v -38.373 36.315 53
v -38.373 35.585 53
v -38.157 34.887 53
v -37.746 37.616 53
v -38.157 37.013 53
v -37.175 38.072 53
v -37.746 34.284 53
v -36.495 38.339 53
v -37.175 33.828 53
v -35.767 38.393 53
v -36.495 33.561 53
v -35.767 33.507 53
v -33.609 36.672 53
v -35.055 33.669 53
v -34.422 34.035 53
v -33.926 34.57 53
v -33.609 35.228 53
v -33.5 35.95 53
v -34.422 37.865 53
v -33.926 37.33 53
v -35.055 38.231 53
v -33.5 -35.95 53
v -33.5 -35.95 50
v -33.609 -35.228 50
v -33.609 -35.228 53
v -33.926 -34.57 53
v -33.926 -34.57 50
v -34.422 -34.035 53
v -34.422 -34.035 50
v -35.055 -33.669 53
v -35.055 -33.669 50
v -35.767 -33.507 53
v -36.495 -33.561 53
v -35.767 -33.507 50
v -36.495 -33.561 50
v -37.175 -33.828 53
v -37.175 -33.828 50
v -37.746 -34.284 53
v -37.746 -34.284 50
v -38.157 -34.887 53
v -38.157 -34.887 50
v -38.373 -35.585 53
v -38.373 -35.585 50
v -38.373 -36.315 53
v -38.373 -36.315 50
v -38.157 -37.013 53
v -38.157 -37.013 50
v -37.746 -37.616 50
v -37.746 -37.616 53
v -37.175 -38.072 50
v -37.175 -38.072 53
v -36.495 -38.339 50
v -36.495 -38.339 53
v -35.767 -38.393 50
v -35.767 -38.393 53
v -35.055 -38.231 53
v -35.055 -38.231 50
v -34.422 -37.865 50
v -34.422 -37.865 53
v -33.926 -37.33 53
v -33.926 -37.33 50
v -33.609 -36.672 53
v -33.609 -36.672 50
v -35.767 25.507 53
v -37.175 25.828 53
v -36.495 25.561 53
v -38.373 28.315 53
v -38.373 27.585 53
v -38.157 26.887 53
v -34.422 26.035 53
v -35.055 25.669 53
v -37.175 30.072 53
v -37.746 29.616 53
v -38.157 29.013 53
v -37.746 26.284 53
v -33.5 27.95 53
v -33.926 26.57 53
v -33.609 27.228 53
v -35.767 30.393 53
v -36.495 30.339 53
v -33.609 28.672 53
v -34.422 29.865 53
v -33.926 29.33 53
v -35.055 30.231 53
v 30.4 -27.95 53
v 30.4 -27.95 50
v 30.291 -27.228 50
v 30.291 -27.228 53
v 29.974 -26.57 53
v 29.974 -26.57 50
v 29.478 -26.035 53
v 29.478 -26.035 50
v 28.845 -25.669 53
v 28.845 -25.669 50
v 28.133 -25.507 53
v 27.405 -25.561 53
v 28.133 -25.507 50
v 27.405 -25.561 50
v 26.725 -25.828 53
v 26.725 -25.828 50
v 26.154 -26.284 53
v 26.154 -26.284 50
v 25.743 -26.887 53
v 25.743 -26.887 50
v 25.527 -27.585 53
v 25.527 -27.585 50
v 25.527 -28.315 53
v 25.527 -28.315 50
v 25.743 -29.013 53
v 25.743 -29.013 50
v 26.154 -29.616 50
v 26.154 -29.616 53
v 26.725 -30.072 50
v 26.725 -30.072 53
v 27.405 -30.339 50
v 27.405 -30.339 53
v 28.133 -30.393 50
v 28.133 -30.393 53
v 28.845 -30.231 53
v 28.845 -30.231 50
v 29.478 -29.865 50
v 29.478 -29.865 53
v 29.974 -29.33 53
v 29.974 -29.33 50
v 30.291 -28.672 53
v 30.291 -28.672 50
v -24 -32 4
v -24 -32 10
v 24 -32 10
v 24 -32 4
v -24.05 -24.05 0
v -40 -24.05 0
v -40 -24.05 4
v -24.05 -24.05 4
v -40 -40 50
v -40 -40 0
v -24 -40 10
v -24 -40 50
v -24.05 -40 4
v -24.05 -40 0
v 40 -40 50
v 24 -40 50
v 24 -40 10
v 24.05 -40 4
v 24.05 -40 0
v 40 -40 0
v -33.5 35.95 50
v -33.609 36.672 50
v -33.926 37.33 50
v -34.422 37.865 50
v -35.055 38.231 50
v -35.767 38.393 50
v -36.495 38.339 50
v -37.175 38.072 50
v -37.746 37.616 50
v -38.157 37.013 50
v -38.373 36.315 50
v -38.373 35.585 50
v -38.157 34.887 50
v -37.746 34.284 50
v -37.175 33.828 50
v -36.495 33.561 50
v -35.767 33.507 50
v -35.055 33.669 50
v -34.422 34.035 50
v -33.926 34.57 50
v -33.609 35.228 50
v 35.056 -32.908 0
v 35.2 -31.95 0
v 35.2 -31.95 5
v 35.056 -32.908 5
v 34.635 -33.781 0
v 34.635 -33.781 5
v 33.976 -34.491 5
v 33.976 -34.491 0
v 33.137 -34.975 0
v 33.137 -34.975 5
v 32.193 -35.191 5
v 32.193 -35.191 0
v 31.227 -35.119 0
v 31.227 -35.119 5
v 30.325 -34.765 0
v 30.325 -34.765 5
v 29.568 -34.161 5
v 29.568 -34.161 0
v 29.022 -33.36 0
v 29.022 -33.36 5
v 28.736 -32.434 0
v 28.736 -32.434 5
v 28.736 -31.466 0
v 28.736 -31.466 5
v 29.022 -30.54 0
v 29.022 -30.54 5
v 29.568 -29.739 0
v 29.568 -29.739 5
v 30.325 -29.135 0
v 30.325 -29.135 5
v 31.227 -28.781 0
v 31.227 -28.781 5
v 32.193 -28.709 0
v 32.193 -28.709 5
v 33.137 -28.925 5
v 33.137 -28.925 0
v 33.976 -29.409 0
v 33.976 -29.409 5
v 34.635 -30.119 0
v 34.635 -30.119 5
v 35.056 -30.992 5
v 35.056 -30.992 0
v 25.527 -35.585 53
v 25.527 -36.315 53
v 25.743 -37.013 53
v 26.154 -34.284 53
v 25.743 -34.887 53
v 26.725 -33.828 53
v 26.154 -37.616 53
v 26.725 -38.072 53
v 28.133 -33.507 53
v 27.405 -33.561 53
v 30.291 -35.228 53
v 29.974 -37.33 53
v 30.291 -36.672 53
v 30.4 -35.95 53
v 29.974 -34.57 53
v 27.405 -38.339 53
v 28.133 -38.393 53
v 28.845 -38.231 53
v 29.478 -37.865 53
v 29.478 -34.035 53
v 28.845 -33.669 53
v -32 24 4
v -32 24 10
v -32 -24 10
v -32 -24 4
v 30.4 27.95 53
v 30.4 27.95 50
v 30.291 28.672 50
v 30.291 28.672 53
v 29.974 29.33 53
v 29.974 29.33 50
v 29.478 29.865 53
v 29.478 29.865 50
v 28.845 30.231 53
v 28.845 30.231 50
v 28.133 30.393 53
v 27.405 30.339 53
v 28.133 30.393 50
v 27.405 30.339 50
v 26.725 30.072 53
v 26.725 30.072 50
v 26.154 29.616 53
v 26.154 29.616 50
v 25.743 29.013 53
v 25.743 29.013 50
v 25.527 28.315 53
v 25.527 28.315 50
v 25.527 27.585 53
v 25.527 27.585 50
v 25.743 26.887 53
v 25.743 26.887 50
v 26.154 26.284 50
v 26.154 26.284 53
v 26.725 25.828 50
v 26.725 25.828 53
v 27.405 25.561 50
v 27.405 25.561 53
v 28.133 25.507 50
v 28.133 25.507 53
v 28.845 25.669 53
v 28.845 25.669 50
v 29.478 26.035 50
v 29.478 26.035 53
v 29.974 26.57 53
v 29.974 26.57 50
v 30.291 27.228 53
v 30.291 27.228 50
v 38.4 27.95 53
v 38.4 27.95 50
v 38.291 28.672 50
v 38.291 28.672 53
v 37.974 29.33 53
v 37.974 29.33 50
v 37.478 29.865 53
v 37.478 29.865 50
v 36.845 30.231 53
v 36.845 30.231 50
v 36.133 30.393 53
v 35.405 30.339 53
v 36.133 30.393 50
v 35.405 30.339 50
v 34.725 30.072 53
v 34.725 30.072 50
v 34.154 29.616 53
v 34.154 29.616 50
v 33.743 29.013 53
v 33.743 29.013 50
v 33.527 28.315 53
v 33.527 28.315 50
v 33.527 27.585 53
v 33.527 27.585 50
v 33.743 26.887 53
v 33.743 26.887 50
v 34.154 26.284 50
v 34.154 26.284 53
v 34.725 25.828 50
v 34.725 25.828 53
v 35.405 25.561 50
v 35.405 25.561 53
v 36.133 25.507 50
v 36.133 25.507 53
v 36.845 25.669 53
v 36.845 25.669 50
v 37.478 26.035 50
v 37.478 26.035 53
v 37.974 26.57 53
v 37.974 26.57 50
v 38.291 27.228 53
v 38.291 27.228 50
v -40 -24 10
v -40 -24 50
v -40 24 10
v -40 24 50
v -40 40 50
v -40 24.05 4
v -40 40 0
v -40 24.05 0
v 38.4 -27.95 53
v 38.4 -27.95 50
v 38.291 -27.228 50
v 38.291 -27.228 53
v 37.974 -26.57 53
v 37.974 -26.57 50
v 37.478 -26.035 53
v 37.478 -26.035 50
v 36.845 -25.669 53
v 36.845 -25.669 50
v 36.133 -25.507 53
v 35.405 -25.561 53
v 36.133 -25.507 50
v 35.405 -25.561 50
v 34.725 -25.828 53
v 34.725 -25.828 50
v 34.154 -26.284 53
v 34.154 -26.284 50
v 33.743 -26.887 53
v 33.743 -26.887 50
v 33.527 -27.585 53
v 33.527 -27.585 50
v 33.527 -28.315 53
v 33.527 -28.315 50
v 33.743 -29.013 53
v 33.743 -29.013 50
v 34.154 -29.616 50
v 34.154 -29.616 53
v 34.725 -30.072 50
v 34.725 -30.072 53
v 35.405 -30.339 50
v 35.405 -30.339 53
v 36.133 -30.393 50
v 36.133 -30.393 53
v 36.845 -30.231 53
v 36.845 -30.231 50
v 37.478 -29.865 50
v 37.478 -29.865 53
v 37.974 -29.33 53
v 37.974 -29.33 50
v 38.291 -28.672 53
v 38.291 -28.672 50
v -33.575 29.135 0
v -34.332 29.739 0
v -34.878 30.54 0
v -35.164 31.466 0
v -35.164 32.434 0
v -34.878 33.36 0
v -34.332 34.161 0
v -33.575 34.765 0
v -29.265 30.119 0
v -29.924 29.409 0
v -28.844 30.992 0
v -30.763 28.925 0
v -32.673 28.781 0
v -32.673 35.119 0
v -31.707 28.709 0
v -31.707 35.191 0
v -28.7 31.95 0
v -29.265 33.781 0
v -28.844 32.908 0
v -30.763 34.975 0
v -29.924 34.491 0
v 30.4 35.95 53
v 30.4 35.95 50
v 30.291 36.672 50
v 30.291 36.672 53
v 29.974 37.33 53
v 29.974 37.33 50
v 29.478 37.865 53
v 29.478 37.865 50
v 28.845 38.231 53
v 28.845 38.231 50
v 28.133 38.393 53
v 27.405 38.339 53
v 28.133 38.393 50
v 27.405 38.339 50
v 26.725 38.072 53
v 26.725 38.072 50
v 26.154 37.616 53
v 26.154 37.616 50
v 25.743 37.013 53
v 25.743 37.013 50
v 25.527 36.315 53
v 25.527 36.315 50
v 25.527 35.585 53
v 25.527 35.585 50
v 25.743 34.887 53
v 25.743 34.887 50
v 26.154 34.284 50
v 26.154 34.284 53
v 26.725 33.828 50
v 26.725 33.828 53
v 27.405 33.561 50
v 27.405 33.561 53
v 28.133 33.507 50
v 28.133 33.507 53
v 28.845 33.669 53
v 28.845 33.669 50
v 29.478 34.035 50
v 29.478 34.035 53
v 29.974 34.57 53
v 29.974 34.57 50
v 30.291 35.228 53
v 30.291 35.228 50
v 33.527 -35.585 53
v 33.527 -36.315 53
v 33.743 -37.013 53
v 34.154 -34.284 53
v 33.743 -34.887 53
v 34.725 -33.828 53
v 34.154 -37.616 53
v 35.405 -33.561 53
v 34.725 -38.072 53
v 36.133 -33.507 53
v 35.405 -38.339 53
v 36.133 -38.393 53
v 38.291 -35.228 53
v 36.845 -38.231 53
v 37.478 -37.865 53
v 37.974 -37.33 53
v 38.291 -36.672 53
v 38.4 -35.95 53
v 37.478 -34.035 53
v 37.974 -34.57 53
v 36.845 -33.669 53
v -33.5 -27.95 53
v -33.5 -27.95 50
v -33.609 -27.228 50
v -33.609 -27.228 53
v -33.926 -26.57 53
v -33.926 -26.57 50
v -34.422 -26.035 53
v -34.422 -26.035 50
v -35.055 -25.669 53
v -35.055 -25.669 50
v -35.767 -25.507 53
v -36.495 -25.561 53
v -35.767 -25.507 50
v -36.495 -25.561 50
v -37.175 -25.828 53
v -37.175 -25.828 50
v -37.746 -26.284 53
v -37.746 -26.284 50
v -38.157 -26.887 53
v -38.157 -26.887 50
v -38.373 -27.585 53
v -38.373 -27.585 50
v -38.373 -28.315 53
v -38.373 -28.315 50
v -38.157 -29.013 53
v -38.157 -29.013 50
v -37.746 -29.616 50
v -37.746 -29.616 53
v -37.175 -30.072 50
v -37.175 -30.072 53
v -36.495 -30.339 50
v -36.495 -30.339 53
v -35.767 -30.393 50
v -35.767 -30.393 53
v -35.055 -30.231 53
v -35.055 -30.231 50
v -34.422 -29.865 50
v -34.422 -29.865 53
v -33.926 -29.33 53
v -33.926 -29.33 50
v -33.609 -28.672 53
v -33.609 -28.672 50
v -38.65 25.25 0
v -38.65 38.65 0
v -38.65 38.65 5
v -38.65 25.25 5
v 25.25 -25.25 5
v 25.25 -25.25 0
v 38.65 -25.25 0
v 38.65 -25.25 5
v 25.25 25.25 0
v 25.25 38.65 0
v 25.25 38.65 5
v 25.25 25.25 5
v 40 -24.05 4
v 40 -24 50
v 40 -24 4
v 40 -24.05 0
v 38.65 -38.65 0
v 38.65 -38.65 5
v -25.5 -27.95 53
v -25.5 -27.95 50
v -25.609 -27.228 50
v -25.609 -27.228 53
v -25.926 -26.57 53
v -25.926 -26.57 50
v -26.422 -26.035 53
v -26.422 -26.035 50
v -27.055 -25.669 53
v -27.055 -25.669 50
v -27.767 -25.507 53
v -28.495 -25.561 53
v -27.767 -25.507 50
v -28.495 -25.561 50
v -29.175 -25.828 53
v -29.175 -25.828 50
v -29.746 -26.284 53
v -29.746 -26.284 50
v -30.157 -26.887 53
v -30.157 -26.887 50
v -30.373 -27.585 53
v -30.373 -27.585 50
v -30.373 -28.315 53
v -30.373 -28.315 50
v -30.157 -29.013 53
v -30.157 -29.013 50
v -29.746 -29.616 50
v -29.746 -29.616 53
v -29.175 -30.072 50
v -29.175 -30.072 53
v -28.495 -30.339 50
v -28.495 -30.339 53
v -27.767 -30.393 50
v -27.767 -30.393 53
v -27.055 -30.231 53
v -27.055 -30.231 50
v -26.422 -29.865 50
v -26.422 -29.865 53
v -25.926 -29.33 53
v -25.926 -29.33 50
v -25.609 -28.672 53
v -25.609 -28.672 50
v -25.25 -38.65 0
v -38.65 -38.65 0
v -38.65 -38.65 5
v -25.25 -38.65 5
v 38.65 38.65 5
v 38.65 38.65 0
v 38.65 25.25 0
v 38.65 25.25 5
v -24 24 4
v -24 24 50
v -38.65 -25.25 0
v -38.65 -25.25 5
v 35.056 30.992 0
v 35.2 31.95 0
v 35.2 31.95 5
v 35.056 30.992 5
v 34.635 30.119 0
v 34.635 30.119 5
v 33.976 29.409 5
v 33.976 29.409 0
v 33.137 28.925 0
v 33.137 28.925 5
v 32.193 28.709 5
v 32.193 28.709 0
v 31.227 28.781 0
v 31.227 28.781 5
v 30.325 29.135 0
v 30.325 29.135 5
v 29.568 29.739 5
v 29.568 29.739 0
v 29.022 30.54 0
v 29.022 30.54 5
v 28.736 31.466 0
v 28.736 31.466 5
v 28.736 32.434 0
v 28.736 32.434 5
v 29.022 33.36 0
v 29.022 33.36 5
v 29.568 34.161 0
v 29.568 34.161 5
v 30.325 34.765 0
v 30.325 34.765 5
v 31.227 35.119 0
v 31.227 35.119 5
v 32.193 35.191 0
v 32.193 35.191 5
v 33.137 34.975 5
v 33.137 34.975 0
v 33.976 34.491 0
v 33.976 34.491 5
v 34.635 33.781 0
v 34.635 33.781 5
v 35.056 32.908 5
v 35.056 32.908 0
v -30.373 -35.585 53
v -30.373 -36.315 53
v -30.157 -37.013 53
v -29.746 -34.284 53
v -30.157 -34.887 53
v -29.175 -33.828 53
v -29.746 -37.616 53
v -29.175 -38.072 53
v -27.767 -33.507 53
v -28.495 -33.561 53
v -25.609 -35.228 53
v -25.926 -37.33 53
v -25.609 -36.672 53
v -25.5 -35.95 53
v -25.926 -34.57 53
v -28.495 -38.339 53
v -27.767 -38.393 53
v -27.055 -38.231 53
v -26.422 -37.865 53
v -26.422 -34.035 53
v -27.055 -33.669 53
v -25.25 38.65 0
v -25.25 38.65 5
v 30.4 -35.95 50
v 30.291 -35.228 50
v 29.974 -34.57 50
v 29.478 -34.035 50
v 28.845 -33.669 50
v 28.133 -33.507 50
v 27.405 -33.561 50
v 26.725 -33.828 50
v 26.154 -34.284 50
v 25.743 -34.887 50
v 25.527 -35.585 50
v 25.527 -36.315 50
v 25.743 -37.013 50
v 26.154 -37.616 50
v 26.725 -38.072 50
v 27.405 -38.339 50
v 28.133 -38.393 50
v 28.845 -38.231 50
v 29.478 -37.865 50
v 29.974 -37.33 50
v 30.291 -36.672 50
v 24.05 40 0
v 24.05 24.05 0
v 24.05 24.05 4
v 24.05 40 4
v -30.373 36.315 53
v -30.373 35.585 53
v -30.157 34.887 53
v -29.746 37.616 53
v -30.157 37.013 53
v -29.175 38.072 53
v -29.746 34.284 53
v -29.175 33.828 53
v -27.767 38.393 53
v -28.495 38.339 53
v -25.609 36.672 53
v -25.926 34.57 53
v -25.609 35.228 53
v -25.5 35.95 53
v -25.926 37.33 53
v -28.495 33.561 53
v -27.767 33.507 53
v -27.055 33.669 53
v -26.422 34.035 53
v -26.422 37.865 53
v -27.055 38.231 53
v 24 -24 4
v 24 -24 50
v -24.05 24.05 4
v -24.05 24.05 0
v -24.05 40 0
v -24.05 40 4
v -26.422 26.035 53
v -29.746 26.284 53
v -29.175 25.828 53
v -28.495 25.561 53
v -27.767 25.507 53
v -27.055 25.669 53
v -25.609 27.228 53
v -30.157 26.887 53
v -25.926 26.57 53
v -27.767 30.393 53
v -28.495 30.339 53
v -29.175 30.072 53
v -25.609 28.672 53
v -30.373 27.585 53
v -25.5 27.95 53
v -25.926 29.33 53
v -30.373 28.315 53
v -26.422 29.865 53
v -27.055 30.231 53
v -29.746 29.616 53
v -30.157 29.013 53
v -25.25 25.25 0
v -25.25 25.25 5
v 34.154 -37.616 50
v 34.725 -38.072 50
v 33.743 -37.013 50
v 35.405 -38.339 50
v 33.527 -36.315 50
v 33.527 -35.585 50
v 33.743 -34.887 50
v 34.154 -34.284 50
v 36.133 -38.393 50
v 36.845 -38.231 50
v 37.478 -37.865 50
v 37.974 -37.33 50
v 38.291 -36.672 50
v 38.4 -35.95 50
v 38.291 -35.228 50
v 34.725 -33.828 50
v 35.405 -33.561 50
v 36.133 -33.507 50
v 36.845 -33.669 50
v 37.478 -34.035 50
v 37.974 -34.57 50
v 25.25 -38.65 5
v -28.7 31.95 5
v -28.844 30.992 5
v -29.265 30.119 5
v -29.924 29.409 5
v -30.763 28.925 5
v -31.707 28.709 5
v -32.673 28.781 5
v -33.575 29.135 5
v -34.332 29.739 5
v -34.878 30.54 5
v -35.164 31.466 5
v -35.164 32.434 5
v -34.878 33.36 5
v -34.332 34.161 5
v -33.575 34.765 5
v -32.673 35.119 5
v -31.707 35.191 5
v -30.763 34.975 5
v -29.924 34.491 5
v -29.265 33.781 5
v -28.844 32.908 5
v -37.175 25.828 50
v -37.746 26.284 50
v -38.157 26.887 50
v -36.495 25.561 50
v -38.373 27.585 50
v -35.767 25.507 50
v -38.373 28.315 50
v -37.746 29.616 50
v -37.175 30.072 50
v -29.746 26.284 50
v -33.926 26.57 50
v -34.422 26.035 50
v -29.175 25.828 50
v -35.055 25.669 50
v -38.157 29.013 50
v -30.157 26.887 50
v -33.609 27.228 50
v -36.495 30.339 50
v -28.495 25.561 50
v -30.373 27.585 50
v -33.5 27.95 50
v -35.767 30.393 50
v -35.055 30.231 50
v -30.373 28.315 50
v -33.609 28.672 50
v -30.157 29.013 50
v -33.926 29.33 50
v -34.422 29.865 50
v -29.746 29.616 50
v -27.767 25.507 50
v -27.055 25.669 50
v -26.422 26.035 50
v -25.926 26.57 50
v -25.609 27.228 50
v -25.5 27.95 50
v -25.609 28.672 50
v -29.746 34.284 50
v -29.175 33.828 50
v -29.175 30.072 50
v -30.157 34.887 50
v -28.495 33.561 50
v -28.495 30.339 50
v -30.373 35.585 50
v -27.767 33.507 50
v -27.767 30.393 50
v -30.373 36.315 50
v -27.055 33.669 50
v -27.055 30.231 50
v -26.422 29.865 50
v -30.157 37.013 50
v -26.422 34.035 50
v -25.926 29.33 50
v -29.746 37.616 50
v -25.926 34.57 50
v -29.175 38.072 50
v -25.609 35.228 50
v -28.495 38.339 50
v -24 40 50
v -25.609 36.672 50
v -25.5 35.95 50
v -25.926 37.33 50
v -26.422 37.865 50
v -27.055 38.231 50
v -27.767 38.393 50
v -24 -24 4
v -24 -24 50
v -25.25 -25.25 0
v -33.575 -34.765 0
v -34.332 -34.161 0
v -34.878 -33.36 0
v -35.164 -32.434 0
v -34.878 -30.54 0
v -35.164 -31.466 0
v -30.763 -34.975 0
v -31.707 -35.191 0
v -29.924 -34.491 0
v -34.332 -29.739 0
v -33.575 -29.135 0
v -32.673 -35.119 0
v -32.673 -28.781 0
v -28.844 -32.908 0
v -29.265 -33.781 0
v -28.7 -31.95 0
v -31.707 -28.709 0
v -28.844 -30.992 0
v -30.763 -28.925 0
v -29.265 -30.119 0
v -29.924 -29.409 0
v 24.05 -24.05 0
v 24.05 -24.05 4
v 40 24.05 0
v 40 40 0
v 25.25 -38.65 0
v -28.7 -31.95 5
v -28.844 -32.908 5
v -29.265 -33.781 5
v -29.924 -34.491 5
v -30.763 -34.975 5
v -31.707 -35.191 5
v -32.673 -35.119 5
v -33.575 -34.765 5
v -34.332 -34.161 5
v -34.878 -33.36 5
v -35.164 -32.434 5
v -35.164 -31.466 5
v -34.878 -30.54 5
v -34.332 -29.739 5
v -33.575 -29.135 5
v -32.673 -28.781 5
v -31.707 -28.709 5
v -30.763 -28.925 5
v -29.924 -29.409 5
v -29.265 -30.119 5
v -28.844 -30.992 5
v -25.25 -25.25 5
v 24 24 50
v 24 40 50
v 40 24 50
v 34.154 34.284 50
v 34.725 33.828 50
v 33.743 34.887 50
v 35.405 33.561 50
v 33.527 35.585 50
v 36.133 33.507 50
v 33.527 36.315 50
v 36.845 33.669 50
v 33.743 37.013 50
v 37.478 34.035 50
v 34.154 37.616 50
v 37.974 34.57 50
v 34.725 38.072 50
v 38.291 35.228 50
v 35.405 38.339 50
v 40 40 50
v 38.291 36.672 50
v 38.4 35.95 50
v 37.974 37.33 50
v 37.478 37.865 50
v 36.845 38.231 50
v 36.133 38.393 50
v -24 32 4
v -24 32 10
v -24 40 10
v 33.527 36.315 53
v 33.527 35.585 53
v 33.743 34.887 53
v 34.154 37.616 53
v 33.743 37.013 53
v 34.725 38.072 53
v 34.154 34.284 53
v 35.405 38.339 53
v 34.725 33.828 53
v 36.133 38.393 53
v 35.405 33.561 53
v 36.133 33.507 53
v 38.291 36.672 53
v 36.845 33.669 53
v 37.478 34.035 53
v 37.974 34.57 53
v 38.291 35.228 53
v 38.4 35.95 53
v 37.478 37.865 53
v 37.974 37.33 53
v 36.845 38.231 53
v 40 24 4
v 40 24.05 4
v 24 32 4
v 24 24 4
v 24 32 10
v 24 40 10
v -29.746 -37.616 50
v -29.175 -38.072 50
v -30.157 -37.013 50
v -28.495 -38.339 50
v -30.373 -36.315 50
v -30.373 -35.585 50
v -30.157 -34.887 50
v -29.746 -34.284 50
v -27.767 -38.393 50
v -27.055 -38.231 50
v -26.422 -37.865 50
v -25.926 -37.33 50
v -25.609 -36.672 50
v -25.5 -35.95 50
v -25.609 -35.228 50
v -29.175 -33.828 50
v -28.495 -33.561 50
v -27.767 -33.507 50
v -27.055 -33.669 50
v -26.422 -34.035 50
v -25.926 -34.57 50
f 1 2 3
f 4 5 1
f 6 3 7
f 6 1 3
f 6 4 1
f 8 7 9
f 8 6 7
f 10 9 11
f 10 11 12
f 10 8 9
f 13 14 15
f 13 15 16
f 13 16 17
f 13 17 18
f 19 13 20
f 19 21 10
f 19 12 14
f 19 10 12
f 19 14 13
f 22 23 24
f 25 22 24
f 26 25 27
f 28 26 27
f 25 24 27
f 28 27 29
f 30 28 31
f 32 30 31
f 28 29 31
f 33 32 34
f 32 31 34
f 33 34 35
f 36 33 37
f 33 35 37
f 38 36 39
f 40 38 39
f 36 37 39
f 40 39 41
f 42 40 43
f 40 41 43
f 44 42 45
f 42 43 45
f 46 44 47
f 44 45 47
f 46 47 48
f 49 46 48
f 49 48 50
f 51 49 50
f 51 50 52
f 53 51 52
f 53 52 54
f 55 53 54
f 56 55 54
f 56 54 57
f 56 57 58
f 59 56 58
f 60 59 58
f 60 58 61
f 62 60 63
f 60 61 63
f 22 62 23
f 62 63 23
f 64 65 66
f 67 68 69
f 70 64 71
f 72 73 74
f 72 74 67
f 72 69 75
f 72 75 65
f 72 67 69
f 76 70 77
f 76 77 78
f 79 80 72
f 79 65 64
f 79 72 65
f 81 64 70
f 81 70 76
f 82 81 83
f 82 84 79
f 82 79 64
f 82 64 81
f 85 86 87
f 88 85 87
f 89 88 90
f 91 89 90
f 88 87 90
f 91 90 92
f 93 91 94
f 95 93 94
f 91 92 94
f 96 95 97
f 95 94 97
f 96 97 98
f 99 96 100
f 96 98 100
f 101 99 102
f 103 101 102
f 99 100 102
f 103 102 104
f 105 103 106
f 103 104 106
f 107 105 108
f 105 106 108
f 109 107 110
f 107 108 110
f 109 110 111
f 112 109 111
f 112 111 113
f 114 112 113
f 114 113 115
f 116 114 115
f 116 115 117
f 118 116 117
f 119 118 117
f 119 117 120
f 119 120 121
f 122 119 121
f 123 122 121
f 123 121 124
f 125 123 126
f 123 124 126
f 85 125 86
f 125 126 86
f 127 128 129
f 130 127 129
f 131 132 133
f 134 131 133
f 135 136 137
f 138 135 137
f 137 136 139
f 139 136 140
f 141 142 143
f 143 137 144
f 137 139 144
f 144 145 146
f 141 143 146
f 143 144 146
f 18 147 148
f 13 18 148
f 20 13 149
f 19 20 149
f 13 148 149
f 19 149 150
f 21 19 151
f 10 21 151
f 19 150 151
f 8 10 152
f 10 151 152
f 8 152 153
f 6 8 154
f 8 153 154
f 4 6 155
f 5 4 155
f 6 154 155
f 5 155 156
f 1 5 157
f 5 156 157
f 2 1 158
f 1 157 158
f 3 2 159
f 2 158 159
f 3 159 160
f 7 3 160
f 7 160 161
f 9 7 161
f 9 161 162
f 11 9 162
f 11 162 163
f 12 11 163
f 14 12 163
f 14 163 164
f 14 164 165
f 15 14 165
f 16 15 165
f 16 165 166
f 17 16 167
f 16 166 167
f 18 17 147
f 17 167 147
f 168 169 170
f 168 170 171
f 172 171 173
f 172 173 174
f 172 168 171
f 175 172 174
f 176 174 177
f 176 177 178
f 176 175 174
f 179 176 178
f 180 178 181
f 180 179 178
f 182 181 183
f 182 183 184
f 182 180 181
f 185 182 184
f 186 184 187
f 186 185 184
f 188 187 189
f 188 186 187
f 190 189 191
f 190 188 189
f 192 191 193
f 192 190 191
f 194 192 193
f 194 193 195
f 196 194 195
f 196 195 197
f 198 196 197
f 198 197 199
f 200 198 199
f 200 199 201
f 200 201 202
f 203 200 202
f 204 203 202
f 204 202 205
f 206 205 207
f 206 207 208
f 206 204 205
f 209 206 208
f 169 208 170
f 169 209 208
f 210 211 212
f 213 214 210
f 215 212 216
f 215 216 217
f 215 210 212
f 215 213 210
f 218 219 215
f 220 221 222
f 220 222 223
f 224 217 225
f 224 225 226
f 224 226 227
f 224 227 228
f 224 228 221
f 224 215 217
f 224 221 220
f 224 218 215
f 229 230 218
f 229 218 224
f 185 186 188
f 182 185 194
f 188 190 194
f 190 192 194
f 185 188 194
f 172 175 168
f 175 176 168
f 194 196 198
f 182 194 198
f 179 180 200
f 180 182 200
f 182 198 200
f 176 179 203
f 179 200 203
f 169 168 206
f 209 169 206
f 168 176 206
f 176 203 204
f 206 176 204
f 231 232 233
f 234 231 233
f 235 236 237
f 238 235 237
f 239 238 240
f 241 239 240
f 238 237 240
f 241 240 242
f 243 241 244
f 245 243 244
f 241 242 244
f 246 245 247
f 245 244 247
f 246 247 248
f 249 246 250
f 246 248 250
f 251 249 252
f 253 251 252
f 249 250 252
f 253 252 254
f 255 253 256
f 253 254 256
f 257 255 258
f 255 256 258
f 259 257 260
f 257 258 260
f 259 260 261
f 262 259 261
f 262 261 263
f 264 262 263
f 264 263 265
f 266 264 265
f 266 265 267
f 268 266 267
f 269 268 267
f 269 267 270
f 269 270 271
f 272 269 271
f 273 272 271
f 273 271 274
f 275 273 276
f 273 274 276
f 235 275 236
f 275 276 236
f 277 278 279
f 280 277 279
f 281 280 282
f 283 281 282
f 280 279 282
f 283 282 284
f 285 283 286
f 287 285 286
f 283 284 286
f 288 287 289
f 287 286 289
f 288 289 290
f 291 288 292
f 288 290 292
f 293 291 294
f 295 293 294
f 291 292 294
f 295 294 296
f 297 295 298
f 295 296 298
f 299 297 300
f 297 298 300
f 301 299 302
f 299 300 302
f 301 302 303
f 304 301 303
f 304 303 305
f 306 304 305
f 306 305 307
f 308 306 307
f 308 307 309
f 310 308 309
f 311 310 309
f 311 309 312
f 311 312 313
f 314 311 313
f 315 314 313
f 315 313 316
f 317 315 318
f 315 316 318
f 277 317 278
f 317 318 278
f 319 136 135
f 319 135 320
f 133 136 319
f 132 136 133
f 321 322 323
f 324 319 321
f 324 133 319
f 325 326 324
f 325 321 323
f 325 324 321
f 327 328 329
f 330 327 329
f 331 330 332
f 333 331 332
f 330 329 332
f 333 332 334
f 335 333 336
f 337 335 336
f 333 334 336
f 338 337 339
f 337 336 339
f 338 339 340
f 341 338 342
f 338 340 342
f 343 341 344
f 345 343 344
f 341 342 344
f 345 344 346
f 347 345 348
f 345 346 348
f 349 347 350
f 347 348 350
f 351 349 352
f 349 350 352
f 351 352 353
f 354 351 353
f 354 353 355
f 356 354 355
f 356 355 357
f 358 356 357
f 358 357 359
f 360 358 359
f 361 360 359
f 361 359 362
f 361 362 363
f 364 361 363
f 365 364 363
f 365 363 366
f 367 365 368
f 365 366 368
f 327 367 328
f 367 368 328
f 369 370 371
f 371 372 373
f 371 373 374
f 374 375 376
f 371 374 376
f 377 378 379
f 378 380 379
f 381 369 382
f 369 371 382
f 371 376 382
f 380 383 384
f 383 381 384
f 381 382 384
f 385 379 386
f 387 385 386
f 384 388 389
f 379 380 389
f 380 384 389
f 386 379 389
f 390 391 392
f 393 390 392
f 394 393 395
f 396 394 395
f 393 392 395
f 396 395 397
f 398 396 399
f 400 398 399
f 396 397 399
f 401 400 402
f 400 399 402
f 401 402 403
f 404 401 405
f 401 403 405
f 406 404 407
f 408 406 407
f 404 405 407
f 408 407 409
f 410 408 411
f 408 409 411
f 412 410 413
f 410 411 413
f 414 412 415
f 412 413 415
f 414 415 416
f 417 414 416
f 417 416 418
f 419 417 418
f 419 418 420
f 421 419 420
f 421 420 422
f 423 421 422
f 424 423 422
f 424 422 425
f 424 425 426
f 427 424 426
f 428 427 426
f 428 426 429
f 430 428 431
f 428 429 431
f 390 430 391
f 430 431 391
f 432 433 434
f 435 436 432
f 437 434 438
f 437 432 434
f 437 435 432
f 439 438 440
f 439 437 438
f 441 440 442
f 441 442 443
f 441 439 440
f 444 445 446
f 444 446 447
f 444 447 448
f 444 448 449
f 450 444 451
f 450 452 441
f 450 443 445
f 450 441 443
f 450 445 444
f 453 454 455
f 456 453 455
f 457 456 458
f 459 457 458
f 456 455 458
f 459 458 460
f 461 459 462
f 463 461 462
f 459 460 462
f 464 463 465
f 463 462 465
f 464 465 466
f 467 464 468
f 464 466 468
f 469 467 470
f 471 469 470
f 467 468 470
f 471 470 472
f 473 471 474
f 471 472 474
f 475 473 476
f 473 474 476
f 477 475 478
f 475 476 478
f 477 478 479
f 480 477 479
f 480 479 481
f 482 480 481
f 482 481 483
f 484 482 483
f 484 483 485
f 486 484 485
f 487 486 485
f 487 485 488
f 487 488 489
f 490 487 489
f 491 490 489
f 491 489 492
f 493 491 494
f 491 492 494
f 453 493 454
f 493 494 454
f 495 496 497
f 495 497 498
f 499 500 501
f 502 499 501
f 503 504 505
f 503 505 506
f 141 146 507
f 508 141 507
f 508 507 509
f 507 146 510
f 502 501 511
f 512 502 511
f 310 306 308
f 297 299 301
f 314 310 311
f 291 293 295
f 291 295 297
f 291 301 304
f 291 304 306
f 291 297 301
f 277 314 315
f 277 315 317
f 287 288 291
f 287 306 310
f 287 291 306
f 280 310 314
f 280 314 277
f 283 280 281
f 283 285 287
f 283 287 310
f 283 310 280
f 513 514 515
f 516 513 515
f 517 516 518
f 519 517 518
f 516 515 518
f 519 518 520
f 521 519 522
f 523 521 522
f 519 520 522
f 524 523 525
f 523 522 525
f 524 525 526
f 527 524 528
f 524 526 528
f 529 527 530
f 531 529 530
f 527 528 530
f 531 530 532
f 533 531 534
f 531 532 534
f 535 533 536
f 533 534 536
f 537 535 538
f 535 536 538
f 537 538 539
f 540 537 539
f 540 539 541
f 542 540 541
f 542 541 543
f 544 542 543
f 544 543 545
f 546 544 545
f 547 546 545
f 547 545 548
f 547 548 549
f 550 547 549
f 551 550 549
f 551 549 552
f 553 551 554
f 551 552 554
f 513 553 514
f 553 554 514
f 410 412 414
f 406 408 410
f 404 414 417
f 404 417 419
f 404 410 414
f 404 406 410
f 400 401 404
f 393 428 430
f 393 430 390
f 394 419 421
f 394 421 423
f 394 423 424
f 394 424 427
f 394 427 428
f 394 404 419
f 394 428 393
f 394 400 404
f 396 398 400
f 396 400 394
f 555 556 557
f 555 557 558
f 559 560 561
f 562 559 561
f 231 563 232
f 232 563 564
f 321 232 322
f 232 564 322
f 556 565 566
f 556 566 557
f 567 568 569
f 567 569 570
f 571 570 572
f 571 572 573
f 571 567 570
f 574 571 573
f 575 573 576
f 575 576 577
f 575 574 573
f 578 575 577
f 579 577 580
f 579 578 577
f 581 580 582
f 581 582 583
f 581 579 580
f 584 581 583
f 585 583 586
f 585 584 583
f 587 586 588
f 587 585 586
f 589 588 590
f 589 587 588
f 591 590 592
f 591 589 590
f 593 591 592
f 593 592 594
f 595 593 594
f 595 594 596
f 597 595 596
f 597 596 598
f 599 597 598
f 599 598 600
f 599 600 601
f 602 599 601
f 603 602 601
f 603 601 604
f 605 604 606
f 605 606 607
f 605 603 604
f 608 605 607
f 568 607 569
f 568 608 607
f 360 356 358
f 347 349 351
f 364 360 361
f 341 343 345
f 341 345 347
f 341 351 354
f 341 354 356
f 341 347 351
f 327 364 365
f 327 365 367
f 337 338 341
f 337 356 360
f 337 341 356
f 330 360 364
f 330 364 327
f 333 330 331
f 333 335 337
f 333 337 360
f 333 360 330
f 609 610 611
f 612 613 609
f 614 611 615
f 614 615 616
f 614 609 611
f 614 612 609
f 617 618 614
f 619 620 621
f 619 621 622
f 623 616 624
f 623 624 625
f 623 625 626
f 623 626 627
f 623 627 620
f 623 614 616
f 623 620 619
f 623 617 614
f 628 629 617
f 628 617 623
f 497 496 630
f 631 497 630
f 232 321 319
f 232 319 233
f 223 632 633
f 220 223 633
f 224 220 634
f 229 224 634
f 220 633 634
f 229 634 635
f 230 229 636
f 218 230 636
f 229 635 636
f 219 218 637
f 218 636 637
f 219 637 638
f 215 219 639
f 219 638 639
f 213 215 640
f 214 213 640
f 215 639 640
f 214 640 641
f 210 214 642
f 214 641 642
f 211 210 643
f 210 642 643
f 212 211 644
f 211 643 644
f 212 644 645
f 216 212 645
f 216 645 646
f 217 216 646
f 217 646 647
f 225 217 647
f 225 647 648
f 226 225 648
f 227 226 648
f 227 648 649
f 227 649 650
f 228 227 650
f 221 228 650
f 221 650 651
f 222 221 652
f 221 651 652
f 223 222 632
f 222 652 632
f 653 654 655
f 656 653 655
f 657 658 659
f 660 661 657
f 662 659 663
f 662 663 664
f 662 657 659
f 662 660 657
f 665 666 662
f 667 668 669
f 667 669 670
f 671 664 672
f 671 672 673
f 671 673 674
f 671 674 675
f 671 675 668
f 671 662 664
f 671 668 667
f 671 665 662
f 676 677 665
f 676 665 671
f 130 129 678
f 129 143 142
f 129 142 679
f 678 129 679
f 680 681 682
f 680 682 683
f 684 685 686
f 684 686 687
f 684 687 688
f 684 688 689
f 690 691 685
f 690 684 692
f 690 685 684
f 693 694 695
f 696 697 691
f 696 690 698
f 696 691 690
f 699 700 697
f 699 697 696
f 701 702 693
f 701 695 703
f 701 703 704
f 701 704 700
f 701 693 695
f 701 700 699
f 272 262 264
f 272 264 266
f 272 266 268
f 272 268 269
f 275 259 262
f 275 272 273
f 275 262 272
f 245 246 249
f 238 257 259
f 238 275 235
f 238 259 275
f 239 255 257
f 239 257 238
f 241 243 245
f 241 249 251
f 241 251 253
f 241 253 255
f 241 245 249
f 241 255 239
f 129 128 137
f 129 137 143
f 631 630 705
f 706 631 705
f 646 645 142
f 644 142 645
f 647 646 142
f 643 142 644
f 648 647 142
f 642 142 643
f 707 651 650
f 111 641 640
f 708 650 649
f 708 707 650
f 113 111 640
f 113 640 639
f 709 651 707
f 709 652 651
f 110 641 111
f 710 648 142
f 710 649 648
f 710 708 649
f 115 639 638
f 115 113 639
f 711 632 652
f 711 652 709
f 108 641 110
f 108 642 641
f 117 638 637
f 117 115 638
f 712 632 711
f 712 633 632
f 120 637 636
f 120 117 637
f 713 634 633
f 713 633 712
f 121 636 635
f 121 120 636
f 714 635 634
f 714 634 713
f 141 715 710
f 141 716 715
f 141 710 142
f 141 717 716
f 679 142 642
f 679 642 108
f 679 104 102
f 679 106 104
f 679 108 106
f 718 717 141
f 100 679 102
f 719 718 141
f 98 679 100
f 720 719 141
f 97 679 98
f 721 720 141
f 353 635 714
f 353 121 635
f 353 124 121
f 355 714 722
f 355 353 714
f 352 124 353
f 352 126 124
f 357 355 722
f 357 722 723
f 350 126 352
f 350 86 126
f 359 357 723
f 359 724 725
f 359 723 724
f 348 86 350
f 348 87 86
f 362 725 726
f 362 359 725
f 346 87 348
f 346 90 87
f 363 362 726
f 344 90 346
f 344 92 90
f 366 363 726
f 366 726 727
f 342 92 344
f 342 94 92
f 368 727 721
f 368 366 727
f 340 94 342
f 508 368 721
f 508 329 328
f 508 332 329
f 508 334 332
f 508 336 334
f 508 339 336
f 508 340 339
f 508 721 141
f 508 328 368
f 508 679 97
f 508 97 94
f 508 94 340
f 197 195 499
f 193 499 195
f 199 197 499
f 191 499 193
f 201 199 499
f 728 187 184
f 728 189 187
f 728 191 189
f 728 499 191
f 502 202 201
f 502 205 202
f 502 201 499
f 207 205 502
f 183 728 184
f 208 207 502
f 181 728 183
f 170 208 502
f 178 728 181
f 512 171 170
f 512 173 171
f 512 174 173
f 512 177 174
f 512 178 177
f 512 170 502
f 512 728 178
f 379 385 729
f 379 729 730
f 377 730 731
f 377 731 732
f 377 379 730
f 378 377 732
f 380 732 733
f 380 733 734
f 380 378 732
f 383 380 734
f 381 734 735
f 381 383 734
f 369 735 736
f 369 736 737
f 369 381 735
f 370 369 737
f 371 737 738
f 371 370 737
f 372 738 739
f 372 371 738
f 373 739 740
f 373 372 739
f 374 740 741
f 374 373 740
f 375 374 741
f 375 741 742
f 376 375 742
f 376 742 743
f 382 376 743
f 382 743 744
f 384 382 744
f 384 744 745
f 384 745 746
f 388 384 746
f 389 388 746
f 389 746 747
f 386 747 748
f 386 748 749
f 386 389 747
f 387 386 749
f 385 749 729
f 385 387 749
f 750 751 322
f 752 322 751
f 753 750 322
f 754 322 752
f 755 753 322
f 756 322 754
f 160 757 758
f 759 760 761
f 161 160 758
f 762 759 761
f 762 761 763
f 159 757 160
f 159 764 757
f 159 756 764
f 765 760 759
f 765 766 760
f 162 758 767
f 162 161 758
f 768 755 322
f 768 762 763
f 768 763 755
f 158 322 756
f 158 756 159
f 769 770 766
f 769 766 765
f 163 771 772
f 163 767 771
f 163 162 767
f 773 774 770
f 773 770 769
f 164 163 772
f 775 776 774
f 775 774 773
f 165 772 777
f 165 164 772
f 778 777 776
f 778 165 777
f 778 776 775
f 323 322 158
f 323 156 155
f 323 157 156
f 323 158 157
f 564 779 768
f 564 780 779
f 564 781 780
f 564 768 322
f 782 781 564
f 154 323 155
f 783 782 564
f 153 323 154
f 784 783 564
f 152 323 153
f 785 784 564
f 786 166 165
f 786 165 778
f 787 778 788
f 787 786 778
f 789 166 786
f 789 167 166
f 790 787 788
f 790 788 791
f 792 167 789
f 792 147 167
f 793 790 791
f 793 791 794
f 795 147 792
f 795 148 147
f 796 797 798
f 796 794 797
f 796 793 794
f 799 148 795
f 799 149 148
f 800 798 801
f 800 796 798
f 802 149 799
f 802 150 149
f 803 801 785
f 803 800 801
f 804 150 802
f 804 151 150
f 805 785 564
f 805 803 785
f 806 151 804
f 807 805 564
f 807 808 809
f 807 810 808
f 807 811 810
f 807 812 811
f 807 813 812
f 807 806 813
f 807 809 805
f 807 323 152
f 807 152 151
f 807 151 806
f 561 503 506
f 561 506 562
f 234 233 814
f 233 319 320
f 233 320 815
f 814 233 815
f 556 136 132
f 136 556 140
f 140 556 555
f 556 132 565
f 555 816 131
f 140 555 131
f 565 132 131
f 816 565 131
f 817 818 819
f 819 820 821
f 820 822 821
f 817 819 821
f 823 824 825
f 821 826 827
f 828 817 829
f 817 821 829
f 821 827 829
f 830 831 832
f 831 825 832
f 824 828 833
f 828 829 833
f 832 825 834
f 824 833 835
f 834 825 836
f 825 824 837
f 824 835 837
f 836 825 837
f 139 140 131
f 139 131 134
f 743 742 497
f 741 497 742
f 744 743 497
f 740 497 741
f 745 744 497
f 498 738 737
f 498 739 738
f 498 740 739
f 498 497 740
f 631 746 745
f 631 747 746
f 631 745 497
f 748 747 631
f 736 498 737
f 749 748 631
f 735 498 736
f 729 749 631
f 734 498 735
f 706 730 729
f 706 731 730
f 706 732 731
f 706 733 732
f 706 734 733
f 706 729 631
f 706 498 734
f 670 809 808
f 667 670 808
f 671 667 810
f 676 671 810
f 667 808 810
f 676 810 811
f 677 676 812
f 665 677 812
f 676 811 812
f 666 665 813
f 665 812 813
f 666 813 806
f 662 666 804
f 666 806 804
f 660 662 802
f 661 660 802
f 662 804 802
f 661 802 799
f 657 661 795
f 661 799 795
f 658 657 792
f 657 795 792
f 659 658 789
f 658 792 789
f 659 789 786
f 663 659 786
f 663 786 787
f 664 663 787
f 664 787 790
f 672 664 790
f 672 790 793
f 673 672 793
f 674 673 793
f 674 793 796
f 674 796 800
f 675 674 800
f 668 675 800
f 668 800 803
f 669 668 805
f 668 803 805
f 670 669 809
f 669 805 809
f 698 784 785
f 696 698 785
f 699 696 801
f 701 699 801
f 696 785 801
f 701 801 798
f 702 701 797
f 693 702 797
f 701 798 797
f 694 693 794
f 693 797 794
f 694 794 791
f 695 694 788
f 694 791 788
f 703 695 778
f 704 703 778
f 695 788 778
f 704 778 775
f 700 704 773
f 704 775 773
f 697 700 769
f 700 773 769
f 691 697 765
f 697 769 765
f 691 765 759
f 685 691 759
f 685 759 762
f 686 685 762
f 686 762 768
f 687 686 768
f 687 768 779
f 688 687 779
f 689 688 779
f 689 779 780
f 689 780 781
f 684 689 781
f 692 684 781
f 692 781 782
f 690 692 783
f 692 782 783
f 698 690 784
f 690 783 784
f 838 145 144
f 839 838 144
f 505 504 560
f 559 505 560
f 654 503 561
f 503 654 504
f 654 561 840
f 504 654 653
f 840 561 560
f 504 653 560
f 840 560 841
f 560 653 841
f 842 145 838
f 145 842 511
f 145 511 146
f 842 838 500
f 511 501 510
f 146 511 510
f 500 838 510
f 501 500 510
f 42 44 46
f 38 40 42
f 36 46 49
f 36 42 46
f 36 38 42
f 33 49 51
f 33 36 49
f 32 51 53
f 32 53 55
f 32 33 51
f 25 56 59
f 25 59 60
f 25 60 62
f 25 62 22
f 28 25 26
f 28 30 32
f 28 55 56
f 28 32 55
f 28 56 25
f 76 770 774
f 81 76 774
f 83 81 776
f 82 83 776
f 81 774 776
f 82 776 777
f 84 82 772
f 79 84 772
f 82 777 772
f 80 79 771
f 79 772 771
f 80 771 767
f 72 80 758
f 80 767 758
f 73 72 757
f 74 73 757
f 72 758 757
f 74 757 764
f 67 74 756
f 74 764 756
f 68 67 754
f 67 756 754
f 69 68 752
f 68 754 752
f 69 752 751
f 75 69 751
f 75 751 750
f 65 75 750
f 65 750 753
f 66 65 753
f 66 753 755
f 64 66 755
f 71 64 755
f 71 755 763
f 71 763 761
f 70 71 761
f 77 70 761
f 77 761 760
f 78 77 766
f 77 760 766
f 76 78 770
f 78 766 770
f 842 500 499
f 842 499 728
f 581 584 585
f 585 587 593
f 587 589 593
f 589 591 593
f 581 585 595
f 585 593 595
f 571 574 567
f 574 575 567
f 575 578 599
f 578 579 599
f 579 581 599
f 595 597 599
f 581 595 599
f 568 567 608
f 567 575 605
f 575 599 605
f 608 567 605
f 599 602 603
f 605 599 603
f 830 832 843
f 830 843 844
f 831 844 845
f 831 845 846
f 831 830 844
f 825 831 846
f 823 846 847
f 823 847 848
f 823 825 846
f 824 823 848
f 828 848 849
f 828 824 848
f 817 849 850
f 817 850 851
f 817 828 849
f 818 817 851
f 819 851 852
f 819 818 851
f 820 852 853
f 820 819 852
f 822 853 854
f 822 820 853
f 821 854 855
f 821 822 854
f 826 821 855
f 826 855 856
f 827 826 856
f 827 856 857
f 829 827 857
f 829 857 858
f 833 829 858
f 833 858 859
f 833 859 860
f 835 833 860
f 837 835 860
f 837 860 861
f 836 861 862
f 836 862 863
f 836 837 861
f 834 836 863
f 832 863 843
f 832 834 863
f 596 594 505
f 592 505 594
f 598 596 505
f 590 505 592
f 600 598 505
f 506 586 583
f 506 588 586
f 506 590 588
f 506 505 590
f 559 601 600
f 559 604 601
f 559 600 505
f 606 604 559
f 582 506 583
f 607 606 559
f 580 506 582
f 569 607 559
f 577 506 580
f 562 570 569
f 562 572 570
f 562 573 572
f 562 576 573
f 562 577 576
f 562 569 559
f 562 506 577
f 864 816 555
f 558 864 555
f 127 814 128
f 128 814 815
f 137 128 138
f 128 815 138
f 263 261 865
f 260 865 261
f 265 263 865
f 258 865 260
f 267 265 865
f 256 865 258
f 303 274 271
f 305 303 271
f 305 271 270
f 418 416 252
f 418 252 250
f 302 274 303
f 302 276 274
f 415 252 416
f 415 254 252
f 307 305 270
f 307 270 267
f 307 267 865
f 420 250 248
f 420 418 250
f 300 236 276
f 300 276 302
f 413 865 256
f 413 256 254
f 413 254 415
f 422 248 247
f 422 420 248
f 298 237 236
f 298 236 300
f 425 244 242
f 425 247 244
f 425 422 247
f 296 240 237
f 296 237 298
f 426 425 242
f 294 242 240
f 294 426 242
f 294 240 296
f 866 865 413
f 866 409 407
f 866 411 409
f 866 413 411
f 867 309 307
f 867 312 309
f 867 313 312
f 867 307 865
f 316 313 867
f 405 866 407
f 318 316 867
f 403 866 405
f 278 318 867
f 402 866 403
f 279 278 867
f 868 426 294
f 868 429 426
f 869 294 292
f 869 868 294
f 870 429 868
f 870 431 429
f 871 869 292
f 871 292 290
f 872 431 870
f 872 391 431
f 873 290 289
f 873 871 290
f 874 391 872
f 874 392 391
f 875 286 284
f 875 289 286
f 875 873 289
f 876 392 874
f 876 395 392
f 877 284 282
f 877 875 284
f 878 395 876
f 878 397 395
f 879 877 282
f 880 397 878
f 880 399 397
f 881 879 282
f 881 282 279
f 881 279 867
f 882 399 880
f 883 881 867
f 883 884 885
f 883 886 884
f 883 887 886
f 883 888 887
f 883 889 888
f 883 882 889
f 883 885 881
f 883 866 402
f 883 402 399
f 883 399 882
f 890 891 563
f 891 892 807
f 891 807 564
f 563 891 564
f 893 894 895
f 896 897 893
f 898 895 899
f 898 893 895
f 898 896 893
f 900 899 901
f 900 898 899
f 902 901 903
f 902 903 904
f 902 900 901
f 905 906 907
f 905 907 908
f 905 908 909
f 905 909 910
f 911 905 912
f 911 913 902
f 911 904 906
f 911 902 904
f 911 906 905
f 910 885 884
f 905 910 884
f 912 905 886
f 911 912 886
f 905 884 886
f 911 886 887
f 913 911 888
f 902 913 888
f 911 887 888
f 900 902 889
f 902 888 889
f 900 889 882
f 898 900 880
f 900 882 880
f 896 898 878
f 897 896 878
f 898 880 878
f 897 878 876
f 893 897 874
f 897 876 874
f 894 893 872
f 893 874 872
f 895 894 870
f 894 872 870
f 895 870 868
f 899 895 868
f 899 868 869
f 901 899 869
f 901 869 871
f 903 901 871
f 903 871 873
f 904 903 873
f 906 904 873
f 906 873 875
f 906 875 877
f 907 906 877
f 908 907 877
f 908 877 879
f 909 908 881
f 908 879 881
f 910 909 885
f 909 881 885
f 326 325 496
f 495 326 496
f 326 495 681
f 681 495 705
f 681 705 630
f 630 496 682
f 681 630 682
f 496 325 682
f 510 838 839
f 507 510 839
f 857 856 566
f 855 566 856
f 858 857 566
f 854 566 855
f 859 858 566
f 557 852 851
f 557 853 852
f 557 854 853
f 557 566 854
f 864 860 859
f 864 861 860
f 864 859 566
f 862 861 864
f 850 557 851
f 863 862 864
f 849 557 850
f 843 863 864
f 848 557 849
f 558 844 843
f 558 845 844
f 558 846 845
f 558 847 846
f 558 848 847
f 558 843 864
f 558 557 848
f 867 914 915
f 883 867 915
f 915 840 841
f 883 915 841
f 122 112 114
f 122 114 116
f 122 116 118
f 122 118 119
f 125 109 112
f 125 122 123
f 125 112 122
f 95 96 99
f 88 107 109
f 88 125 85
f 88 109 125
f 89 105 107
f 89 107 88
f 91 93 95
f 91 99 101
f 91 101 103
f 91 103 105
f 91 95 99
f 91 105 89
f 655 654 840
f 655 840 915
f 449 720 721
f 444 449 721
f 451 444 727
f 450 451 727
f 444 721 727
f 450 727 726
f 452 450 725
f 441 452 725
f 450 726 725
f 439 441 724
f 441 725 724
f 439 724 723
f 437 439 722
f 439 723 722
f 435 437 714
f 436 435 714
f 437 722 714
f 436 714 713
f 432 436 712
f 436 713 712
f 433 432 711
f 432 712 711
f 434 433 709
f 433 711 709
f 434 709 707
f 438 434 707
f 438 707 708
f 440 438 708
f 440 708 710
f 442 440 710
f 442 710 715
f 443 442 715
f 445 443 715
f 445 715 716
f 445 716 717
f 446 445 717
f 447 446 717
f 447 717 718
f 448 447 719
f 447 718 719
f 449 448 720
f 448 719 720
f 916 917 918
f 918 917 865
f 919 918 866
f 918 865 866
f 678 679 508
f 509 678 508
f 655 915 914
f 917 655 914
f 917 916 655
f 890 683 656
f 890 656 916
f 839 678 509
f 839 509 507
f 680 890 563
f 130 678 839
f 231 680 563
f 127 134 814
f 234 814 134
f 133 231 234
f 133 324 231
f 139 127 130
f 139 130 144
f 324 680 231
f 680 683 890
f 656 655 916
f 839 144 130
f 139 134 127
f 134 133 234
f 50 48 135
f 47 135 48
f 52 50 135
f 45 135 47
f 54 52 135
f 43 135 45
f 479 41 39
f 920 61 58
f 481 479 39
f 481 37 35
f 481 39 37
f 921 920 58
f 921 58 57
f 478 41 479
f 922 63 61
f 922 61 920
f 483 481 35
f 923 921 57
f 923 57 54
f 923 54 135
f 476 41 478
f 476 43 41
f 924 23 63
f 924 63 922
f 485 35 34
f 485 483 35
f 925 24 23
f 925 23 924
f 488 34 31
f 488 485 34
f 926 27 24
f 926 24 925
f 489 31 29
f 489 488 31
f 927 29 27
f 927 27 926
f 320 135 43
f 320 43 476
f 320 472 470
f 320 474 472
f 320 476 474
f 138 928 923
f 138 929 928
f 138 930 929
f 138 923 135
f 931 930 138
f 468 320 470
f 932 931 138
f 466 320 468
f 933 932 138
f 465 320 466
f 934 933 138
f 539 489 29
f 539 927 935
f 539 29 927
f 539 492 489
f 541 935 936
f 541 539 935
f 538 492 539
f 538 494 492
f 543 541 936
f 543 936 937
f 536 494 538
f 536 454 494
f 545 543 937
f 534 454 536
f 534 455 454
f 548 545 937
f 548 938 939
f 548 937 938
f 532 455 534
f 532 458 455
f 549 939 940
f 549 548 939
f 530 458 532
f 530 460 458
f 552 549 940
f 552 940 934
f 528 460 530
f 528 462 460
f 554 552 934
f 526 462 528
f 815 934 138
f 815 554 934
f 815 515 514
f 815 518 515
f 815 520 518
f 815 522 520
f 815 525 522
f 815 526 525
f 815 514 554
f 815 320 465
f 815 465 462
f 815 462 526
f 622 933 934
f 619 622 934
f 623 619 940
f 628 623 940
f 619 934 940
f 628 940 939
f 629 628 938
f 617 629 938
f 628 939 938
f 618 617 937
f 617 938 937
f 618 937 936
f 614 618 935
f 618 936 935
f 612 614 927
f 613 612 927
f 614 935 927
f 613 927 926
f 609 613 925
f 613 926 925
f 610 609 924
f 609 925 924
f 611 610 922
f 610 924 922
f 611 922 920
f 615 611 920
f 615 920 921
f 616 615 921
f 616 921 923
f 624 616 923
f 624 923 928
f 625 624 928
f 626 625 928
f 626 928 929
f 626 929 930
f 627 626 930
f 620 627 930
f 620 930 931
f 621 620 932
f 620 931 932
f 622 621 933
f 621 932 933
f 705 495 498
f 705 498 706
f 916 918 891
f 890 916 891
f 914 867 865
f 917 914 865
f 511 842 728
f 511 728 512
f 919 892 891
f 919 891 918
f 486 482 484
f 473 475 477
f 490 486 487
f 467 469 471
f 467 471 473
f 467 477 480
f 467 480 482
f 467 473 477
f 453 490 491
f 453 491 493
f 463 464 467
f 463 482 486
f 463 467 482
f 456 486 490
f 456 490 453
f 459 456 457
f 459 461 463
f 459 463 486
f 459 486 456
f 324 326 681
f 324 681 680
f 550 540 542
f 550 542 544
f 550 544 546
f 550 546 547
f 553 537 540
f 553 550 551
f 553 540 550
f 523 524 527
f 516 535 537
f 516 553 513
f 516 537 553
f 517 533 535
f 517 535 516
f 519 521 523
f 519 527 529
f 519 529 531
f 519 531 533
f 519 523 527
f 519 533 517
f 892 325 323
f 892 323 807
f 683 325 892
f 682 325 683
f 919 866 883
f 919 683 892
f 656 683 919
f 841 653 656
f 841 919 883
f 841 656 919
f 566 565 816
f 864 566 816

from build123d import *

# Parameters (mm, degrees)
SKETCH_W        = 80
SKETCH_H        = 80
PAD_DEPTH       = 50
SKETCH007_W     = 13.4
SKETCH007_H     = 13.4
SKETCH007_R     = 3.25
POCKET_DEPTH    = 5
SKETCH004_R     = 2.45
PAD001_DEPTH    = 3
POCKET001_DEPTH = 40
POCKET002_DEPTH = 10.001
SKETCH002_W     = 48.1
SKETCH002_H     = 4
POCKET003_DEPTH = 80.001
SKETCH003_W     = 48.1
SKETCH003_H     = 4
POCKET004_DEPTH = 80.001


with BuildPart() as part:
    # Sketch → Pad (new body)
    with BuildSketch(Plane.XY):
        Rectangle(SKETCH_W, SKETCH_H)
    extrude(amount=PAD_DEPTH)

    # Sketch007 → Pocket (cut)
    with BuildSketch(Plane(origin=(0, 0, 0), x_dir=(1, 0, 0), z_dir=(0, 0, -1))):
        with Locations((-31.95, 31.95)):
            Rectangle(SKETCH007_W, SKETCH007_H)
        with Locations((-31.95, 31.95)):
            Circle(SKETCH007_R, mode=Mode.SUBTRACT)
        with Locations((31.95, 31.95)):
            Rectangle(SKETCH007_W, SKETCH007_H)
        with Locations((31.95, 31.95)):
            Circle(SKETCH007_R, mode=Mode.SUBTRACT)
        with Locations((-31.95, -31.95)):
            Rectangle(SKETCH007_W, SKETCH007_H)
        with Locations((-31.95, -31.95)):
            Circle(SKETCH007_R, mode=Mode.SUBTRACT)
        with Locations((31.95, -31.95)):
            Rectangle(SKETCH007_W, SKETCH007_H)
        with Locations((31.95, -31.95)):
            Circle(SKETCH007_R, mode=Mode.SUBTRACT)
    extrude(amount=-POCKET_DEPTH, mode=Mode.SUBTRACT)

    # Sketch004 → Pad001 (new body)
    with BuildSketch(Plane.XY.offset(50)):
        with Locations((-35.95, -35.95)):
            Circle(SKETCH004_R)
        with Locations((35.95, 35.95)):
            Circle(SKETCH004_R)
        with Locations((35.95, -35.95)):
            Circle(SKETCH004_R)
        with Locations((-35.95, 35.95)):
            Circle(SKETCH004_R)
        with Locations((-27.95, 35.95)):
            Circle(SKETCH004_R)
        with Locations((-27.95, 27.95)):
            Circle(SKETCH004_R)
        with Locations((27.95, 27.95)):
            Circle(SKETCH004_R)
        with Locations((27.95, 35.95)):
            Circle(SKETCH004_R)
        with Locations((-35.95, 27.95)):
            Circle(SKETCH004_R)
        with Locations((35.95, 27.95)):
            Circle(SKETCH004_R)
        with Locations((27.95, -27.95)):
            Circle(SKETCH004_R)
        with Locations((27.95, -35.95)):
            Circle(SKETCH004_R)
        with Locations((35.95, -27.95)):
            Circle(SKETCH004_R)
        with Locations((-27.95, -27.95)):
            Circle(SKETCH004_R)
        with Locations((-27.95, -35.95)):
            Circle(SKETCH004_R)
        with Locations((-35.95, -27.95)):
            Circle(SKETCH004_R)
    extrude(amount=PAD001_DEPTH)

    # Sketch008 → Pocket001 (cut)
    with BuildSketch(Plane.XY.offset(50)):
        Polygon((-24, 40), (-24, 24), (-40, 24), (-40, -24), (-24, -24), (-24, -40), (24, -40), (24, -24), (40, -24), (40, 24), (24, 24), (24, 40), align=None)
    extrude(amount=-POCKET001_DEPTH, mode=Mode.SUBTRACT)

    # Sketch005 → Pocket002 (cut, through all)
    with BuildSketch(Plane.XY.offset(10)):
        Polygon((24, 24), (24, 32), (-24, 32), (-24, 24), (-32, 24), (-32, -24), (-24, -24), (-24, -32), (24, -32), (24, -24), (40, -24), (40, 24), align=None)
    extrude(amount=-POCKET002_DEPTH, mode=Mode.SUBTRACT)

    # Sketch002 → Pocket003 (cut, through all)
    with BuildSketch(Plane.XZ.offset(40)):
        with Locations((0, 2)):
            Rectangle(SKETCH002_W, SKETCH002_H)
    extrude(amount=-POCKET003_DEPTH, mode=Mode.SUBTRACT)

    # Sketch003 → Pocket004 (cut, through all)
    with BuildSketch(Plane(origin=(-40, 0, 0), x_dir=(0, -1, 0), z_dir=(-1, 0, 0))):
        with Locations((0, 2)):
            Rectangle(SKETCH003_W, SKETCH003_H)
    extrude(amount=-POCKET004_DEPTH, mode=Mode.SUBTRACT)


solid = part.part
